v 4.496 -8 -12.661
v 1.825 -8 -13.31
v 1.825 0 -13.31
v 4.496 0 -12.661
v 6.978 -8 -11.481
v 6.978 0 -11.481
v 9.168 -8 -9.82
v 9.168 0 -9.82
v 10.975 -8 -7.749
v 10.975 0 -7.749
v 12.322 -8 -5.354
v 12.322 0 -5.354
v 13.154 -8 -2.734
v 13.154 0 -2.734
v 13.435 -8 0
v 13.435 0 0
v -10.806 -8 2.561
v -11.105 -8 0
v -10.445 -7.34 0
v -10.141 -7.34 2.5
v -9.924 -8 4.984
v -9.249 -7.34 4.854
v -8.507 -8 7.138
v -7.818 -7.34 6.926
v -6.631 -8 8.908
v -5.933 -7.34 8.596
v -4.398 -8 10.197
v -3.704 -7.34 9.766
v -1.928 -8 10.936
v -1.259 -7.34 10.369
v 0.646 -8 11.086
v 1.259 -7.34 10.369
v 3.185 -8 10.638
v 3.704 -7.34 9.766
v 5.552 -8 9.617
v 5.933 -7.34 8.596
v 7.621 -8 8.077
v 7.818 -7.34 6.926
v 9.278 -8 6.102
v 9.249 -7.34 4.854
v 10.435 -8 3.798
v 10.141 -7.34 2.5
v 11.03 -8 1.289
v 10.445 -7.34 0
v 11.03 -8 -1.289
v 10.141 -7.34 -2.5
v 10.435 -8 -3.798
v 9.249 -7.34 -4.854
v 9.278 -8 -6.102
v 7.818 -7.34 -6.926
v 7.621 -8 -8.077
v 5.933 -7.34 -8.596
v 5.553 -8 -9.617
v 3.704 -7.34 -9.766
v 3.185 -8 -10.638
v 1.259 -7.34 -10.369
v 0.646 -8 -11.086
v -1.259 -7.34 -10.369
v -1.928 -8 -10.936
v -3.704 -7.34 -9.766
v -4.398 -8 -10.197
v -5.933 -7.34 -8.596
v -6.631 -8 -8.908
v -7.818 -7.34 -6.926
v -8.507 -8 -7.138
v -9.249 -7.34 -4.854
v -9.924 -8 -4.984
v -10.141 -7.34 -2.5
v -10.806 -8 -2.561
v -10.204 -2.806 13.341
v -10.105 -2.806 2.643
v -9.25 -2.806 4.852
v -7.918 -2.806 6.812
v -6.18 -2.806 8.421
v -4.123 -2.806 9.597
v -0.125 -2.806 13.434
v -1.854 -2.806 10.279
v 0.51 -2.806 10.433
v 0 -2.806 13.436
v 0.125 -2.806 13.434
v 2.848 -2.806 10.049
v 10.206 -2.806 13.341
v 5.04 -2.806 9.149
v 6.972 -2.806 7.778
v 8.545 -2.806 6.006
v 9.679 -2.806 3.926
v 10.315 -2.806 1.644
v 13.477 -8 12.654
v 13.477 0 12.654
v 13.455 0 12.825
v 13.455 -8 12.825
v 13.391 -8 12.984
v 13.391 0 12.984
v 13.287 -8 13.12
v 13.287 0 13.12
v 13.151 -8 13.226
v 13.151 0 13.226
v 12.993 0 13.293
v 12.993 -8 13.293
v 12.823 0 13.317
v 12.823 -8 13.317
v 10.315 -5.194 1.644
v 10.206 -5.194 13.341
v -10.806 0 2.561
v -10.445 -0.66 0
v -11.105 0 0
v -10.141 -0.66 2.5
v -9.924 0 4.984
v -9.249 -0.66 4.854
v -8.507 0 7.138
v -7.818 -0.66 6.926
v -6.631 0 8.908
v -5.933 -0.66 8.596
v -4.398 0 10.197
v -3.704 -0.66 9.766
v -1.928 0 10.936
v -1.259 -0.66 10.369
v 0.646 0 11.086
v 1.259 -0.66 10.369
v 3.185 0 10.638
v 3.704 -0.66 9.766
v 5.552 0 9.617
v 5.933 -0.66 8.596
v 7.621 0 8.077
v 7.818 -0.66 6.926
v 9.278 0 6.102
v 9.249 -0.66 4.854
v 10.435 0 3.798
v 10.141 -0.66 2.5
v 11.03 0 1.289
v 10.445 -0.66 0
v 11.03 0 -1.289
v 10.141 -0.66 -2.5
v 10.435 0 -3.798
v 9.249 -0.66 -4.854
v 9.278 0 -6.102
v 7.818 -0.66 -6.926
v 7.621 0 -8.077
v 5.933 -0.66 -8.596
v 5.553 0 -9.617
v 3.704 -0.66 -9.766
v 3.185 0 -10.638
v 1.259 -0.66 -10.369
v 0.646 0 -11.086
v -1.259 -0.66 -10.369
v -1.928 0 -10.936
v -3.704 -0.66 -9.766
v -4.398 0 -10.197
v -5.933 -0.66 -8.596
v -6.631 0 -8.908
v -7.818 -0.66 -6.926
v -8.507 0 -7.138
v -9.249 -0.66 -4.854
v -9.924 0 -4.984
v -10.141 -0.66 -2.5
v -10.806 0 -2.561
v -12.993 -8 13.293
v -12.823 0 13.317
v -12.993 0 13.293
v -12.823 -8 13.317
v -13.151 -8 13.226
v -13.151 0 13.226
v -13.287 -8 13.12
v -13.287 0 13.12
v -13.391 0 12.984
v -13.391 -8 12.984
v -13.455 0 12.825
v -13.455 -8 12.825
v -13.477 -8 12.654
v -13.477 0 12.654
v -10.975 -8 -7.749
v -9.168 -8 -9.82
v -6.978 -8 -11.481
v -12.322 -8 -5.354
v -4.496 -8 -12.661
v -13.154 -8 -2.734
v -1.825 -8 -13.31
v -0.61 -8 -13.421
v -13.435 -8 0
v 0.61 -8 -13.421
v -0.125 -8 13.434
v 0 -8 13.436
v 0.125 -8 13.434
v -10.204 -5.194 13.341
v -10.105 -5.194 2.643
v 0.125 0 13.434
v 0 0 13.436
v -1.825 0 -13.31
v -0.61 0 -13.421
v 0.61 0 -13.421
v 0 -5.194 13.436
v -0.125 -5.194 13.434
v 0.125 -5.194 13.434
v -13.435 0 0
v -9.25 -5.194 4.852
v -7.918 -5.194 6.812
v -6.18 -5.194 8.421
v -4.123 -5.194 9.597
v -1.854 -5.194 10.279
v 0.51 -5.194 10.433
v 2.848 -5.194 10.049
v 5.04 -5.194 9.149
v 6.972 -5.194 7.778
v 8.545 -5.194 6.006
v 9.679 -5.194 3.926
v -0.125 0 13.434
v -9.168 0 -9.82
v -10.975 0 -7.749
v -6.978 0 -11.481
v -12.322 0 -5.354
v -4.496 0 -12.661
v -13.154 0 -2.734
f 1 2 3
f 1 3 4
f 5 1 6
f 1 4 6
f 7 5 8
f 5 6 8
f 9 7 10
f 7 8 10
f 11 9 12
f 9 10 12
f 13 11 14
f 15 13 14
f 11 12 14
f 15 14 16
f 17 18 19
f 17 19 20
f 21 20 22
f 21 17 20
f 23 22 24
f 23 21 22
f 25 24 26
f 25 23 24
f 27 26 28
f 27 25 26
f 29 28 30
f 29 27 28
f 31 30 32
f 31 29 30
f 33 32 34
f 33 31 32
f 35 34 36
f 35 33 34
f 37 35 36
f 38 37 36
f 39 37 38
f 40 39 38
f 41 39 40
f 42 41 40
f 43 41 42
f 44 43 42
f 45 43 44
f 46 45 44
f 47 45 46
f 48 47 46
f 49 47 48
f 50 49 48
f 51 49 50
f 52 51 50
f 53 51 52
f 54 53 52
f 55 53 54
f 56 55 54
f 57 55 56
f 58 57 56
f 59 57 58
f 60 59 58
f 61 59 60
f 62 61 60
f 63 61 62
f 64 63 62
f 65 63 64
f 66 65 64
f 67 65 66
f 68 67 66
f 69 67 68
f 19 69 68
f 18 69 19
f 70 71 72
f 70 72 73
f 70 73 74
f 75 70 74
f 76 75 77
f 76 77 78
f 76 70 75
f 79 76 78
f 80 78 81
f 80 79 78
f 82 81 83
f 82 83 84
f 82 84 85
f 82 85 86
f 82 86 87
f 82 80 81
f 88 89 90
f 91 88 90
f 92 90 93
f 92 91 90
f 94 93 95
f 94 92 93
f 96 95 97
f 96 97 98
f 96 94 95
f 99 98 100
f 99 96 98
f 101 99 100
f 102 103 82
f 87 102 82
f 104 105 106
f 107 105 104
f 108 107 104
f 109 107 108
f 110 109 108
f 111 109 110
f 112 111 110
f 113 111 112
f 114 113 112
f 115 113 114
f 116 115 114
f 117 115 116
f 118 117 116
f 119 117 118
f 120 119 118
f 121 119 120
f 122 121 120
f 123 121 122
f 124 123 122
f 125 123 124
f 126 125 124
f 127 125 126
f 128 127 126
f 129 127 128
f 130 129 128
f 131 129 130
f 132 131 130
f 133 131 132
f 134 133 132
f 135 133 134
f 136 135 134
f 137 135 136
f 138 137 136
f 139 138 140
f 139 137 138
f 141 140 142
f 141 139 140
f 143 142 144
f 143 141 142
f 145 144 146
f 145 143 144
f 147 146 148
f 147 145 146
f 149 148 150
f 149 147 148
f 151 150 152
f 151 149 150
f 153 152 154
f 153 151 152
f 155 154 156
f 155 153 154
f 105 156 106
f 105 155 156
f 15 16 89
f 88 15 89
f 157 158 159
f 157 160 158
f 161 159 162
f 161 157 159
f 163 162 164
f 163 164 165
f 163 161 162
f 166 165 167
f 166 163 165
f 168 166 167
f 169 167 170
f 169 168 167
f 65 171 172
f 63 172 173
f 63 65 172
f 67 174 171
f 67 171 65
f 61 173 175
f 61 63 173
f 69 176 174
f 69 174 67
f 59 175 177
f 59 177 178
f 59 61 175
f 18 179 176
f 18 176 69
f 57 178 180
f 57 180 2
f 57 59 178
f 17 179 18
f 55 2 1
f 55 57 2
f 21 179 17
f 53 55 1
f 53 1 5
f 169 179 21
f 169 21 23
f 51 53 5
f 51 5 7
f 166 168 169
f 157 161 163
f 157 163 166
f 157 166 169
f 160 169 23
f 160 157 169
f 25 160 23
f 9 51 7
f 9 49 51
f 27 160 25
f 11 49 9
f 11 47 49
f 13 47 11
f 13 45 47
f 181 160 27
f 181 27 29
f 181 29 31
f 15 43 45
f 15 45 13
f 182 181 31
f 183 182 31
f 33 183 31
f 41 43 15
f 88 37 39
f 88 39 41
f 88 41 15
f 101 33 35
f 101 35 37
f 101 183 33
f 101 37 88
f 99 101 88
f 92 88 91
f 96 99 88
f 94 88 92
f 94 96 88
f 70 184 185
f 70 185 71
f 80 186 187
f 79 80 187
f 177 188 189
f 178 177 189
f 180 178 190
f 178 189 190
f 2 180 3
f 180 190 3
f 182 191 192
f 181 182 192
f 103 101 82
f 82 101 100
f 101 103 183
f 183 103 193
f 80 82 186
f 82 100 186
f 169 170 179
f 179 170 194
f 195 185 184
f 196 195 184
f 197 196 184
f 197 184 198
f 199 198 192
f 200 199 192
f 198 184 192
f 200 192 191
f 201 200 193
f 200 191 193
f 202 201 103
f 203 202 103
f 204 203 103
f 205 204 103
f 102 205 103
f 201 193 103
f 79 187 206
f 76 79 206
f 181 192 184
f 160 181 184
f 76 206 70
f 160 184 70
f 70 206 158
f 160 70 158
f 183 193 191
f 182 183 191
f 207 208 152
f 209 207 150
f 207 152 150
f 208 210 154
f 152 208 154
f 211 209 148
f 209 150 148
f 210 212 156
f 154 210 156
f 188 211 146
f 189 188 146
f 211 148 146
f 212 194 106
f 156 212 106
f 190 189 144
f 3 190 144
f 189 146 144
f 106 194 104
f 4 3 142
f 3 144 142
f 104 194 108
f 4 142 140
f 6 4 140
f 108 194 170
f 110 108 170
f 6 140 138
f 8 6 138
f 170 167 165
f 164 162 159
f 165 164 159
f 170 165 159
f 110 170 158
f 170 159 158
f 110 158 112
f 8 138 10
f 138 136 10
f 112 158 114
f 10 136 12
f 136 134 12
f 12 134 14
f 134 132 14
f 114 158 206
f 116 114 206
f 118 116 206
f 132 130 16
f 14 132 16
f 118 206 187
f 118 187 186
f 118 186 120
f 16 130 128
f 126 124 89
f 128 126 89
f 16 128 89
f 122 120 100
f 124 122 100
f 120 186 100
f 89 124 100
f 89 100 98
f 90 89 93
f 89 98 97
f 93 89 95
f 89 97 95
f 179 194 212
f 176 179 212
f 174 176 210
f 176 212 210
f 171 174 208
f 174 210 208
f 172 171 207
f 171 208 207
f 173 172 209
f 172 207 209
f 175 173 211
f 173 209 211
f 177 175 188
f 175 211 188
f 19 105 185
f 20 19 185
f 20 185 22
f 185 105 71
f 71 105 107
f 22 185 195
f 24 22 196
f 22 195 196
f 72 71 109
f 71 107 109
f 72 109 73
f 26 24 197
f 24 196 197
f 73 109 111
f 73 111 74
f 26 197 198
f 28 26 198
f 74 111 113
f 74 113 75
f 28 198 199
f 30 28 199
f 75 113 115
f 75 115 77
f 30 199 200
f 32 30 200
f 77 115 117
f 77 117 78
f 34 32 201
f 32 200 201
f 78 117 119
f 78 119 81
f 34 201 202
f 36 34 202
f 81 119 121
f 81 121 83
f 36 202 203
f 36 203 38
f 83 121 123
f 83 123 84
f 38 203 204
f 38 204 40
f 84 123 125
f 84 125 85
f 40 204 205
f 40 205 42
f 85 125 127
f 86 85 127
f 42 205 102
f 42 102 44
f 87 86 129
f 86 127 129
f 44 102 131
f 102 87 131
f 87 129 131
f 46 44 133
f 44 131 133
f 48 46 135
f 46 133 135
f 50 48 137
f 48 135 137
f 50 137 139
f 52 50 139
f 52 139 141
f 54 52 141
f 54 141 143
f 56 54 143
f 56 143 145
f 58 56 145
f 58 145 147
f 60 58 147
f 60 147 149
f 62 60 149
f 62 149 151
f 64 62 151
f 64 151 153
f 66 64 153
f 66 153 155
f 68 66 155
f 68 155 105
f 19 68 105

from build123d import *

# Parameters (mm, degrees)
F1_DEPTH = 8
F2_W     = 20.4098413018
F2_H     = 2.387965478
F3_DEPTH = 13.1
F4_R     = 0.66
F5_SIZE  = 0.66


with BuildPart() as f1:
    # F0 (on Front) → F1 (new body)
    with BuildSketch(Plane.XZ):
        with BuildLine():
            Line((13.435, 0), (10.445, 0))
            ThreePointArc((10.445, 0), (0, -10.445), (-10.445, 0))
            Line((-10.445, 0), (-13.435, 0))
            ThreePointArc((-13.435, 0), (-10.1247178165, -8.8311558777), (-1.8251281523, -13.3104519919))
            Line((-1.8251281523, -13.3104519919), (1.8251281523, -13.3104519919))
            ThreePointArc((1.8251281523, -13.3104519919), (10.1247178165, -8.8311558777), (13.435, 0))
        make_face()
        with BuildLine():
            ThreePointArc((-10.445, 0), (0, 10.445), (10.445, 0))
            Line((10.445, 0), (13.435, 0))
            ThreePointArc((13.435, 0), (10.1247178165, 8.8311558777), (1.8251281523, 13.3104519919))
            Line((1.8251281523, 13.3104519919), (-1.8251281523, 13.3104519919))
            ThreePointArc((-1.8251281523, 13.3104519919), (-10.1247178165, 8.8311558777), (-13.435, 0))
            Line((-13.435, 0), (-10.445, 0))
        make_face()
        with BuildLine():
            ThreePointArc((1.8251281523, 13.3104519919), (10.1247178165, 8.8311558777), (13.435, 0))
            Line((13.435, 0), (13.4794265032, 13.3104519919))
            Line((13.4794265032, 13.3104519919), (1.8251281523, 13.3104519919))
        make_face()
        with BuildLine():
            Line((-13.4794265032, 13.3104519919), (-13.435, 0))
            ThreePointArc((-13.435, 0), (-10.1247178165, 8.8311558777), (-1.8251281523, 13.3104519919))
            Line((-1.8251281523, 13.3104519919), (-13.4794265032, 13.3104519919))
        make_face()
        with BuildLine():
            ThreePointArc((-1.8251281523, -13.3104519919), (0, -13.435), (1.8251281523, -13.3104519919))
            Line((1.8251281523, -13.3104519919), (-1.8251281523, -13.3104519919))
        make_face()
        with BuildLine():
            Line((-1.8251281523, 13.3104519919), (1.8251281523, 13.3104519919))
            ThreePointArc((1.8251281523, 13.3104519919), (0.9768871079, 13.3994371739), (0.1247091036, 13.4344211874))
            ThreePointArc((0.1247091036, 13.4344211874), (2e-08, 13.435), (-0.1247090636, 13.4344211877))
            ThreePointArc((-0.1247090636, 13.4344211877), (-0.9768870879, 13.3994371754), (-1.8251281523, 13.3104519919))
        make_face()
        with BuildLine():
            ThreePointArc((0.1247091036, 13.4344211874), (0.9768871079, 13.3994371739), (1.8251281523, 13.3104519919))
            Line((1.8251281523, 13.3104519919), (13.4794265032, 13.3104519919))
            Line((13.4794265032, 13.3104519919), (0.1247091036, 13.4344211874))
        make_face()
        with BuildLine():
            Line((-13.4794265032, 13.3104519919), (-1.8251281523, 13.3104519919))
            ThreePointArc((-1.8251281523, 13.3104519919), (-0.9768870879, 13.3994371754), (-0.1247090636, 13.4344211877))
            Line((-0.1247090636, 13.4344211877), (-13.4794265032, 13.3104519919))
        make_face()
        with BuildLine():
            ThreePointArc((-0.1247090636, 13.4344211877), (2e-08, 13.435), (0.1247091036, 13.4344211874))
            Line((0.1247091036, 13.4344211874), (0, 13.4355788373))
            Line((0, 13.4355788373), (-0.1247090636, 13.4344211877))
        make_face()
    extrude(amount=F1_DEPTH)

    # F2 (on face) → F3 (cut)
    with BuildSketch(Plane(origin=(-0.12470907, 0, 13.4344211877), x_dir=(0.9999569176, 0, 0.0092824019), z_dir=(-0.0092824019, 0, 0.9999569176))):
        with Locations((0.124714443, -4)):
            Rectangle(F2_W, F2_H)
    extrude(amount=-F3_DEPTH, mode=Mode.SUBTRACT)

    # F4
    f4_edges = [f1.edges().sort_by_distance(p)[0] for p in [
        (-13.479427, -4, 13.310452),
        (13.479427, -4, 13.310452),
    ]]
    fillet(f4_edges, radius=F4_R)

    # F5
    f5_edges = [f1.edges().sort_by_distance(p)[0] for p in [
        (10.445, 0, 0),
        (10.445, -8, 0),
    ]]
    chamfer(f5_edges, length=F5_SIZE)


solid = f1.part
